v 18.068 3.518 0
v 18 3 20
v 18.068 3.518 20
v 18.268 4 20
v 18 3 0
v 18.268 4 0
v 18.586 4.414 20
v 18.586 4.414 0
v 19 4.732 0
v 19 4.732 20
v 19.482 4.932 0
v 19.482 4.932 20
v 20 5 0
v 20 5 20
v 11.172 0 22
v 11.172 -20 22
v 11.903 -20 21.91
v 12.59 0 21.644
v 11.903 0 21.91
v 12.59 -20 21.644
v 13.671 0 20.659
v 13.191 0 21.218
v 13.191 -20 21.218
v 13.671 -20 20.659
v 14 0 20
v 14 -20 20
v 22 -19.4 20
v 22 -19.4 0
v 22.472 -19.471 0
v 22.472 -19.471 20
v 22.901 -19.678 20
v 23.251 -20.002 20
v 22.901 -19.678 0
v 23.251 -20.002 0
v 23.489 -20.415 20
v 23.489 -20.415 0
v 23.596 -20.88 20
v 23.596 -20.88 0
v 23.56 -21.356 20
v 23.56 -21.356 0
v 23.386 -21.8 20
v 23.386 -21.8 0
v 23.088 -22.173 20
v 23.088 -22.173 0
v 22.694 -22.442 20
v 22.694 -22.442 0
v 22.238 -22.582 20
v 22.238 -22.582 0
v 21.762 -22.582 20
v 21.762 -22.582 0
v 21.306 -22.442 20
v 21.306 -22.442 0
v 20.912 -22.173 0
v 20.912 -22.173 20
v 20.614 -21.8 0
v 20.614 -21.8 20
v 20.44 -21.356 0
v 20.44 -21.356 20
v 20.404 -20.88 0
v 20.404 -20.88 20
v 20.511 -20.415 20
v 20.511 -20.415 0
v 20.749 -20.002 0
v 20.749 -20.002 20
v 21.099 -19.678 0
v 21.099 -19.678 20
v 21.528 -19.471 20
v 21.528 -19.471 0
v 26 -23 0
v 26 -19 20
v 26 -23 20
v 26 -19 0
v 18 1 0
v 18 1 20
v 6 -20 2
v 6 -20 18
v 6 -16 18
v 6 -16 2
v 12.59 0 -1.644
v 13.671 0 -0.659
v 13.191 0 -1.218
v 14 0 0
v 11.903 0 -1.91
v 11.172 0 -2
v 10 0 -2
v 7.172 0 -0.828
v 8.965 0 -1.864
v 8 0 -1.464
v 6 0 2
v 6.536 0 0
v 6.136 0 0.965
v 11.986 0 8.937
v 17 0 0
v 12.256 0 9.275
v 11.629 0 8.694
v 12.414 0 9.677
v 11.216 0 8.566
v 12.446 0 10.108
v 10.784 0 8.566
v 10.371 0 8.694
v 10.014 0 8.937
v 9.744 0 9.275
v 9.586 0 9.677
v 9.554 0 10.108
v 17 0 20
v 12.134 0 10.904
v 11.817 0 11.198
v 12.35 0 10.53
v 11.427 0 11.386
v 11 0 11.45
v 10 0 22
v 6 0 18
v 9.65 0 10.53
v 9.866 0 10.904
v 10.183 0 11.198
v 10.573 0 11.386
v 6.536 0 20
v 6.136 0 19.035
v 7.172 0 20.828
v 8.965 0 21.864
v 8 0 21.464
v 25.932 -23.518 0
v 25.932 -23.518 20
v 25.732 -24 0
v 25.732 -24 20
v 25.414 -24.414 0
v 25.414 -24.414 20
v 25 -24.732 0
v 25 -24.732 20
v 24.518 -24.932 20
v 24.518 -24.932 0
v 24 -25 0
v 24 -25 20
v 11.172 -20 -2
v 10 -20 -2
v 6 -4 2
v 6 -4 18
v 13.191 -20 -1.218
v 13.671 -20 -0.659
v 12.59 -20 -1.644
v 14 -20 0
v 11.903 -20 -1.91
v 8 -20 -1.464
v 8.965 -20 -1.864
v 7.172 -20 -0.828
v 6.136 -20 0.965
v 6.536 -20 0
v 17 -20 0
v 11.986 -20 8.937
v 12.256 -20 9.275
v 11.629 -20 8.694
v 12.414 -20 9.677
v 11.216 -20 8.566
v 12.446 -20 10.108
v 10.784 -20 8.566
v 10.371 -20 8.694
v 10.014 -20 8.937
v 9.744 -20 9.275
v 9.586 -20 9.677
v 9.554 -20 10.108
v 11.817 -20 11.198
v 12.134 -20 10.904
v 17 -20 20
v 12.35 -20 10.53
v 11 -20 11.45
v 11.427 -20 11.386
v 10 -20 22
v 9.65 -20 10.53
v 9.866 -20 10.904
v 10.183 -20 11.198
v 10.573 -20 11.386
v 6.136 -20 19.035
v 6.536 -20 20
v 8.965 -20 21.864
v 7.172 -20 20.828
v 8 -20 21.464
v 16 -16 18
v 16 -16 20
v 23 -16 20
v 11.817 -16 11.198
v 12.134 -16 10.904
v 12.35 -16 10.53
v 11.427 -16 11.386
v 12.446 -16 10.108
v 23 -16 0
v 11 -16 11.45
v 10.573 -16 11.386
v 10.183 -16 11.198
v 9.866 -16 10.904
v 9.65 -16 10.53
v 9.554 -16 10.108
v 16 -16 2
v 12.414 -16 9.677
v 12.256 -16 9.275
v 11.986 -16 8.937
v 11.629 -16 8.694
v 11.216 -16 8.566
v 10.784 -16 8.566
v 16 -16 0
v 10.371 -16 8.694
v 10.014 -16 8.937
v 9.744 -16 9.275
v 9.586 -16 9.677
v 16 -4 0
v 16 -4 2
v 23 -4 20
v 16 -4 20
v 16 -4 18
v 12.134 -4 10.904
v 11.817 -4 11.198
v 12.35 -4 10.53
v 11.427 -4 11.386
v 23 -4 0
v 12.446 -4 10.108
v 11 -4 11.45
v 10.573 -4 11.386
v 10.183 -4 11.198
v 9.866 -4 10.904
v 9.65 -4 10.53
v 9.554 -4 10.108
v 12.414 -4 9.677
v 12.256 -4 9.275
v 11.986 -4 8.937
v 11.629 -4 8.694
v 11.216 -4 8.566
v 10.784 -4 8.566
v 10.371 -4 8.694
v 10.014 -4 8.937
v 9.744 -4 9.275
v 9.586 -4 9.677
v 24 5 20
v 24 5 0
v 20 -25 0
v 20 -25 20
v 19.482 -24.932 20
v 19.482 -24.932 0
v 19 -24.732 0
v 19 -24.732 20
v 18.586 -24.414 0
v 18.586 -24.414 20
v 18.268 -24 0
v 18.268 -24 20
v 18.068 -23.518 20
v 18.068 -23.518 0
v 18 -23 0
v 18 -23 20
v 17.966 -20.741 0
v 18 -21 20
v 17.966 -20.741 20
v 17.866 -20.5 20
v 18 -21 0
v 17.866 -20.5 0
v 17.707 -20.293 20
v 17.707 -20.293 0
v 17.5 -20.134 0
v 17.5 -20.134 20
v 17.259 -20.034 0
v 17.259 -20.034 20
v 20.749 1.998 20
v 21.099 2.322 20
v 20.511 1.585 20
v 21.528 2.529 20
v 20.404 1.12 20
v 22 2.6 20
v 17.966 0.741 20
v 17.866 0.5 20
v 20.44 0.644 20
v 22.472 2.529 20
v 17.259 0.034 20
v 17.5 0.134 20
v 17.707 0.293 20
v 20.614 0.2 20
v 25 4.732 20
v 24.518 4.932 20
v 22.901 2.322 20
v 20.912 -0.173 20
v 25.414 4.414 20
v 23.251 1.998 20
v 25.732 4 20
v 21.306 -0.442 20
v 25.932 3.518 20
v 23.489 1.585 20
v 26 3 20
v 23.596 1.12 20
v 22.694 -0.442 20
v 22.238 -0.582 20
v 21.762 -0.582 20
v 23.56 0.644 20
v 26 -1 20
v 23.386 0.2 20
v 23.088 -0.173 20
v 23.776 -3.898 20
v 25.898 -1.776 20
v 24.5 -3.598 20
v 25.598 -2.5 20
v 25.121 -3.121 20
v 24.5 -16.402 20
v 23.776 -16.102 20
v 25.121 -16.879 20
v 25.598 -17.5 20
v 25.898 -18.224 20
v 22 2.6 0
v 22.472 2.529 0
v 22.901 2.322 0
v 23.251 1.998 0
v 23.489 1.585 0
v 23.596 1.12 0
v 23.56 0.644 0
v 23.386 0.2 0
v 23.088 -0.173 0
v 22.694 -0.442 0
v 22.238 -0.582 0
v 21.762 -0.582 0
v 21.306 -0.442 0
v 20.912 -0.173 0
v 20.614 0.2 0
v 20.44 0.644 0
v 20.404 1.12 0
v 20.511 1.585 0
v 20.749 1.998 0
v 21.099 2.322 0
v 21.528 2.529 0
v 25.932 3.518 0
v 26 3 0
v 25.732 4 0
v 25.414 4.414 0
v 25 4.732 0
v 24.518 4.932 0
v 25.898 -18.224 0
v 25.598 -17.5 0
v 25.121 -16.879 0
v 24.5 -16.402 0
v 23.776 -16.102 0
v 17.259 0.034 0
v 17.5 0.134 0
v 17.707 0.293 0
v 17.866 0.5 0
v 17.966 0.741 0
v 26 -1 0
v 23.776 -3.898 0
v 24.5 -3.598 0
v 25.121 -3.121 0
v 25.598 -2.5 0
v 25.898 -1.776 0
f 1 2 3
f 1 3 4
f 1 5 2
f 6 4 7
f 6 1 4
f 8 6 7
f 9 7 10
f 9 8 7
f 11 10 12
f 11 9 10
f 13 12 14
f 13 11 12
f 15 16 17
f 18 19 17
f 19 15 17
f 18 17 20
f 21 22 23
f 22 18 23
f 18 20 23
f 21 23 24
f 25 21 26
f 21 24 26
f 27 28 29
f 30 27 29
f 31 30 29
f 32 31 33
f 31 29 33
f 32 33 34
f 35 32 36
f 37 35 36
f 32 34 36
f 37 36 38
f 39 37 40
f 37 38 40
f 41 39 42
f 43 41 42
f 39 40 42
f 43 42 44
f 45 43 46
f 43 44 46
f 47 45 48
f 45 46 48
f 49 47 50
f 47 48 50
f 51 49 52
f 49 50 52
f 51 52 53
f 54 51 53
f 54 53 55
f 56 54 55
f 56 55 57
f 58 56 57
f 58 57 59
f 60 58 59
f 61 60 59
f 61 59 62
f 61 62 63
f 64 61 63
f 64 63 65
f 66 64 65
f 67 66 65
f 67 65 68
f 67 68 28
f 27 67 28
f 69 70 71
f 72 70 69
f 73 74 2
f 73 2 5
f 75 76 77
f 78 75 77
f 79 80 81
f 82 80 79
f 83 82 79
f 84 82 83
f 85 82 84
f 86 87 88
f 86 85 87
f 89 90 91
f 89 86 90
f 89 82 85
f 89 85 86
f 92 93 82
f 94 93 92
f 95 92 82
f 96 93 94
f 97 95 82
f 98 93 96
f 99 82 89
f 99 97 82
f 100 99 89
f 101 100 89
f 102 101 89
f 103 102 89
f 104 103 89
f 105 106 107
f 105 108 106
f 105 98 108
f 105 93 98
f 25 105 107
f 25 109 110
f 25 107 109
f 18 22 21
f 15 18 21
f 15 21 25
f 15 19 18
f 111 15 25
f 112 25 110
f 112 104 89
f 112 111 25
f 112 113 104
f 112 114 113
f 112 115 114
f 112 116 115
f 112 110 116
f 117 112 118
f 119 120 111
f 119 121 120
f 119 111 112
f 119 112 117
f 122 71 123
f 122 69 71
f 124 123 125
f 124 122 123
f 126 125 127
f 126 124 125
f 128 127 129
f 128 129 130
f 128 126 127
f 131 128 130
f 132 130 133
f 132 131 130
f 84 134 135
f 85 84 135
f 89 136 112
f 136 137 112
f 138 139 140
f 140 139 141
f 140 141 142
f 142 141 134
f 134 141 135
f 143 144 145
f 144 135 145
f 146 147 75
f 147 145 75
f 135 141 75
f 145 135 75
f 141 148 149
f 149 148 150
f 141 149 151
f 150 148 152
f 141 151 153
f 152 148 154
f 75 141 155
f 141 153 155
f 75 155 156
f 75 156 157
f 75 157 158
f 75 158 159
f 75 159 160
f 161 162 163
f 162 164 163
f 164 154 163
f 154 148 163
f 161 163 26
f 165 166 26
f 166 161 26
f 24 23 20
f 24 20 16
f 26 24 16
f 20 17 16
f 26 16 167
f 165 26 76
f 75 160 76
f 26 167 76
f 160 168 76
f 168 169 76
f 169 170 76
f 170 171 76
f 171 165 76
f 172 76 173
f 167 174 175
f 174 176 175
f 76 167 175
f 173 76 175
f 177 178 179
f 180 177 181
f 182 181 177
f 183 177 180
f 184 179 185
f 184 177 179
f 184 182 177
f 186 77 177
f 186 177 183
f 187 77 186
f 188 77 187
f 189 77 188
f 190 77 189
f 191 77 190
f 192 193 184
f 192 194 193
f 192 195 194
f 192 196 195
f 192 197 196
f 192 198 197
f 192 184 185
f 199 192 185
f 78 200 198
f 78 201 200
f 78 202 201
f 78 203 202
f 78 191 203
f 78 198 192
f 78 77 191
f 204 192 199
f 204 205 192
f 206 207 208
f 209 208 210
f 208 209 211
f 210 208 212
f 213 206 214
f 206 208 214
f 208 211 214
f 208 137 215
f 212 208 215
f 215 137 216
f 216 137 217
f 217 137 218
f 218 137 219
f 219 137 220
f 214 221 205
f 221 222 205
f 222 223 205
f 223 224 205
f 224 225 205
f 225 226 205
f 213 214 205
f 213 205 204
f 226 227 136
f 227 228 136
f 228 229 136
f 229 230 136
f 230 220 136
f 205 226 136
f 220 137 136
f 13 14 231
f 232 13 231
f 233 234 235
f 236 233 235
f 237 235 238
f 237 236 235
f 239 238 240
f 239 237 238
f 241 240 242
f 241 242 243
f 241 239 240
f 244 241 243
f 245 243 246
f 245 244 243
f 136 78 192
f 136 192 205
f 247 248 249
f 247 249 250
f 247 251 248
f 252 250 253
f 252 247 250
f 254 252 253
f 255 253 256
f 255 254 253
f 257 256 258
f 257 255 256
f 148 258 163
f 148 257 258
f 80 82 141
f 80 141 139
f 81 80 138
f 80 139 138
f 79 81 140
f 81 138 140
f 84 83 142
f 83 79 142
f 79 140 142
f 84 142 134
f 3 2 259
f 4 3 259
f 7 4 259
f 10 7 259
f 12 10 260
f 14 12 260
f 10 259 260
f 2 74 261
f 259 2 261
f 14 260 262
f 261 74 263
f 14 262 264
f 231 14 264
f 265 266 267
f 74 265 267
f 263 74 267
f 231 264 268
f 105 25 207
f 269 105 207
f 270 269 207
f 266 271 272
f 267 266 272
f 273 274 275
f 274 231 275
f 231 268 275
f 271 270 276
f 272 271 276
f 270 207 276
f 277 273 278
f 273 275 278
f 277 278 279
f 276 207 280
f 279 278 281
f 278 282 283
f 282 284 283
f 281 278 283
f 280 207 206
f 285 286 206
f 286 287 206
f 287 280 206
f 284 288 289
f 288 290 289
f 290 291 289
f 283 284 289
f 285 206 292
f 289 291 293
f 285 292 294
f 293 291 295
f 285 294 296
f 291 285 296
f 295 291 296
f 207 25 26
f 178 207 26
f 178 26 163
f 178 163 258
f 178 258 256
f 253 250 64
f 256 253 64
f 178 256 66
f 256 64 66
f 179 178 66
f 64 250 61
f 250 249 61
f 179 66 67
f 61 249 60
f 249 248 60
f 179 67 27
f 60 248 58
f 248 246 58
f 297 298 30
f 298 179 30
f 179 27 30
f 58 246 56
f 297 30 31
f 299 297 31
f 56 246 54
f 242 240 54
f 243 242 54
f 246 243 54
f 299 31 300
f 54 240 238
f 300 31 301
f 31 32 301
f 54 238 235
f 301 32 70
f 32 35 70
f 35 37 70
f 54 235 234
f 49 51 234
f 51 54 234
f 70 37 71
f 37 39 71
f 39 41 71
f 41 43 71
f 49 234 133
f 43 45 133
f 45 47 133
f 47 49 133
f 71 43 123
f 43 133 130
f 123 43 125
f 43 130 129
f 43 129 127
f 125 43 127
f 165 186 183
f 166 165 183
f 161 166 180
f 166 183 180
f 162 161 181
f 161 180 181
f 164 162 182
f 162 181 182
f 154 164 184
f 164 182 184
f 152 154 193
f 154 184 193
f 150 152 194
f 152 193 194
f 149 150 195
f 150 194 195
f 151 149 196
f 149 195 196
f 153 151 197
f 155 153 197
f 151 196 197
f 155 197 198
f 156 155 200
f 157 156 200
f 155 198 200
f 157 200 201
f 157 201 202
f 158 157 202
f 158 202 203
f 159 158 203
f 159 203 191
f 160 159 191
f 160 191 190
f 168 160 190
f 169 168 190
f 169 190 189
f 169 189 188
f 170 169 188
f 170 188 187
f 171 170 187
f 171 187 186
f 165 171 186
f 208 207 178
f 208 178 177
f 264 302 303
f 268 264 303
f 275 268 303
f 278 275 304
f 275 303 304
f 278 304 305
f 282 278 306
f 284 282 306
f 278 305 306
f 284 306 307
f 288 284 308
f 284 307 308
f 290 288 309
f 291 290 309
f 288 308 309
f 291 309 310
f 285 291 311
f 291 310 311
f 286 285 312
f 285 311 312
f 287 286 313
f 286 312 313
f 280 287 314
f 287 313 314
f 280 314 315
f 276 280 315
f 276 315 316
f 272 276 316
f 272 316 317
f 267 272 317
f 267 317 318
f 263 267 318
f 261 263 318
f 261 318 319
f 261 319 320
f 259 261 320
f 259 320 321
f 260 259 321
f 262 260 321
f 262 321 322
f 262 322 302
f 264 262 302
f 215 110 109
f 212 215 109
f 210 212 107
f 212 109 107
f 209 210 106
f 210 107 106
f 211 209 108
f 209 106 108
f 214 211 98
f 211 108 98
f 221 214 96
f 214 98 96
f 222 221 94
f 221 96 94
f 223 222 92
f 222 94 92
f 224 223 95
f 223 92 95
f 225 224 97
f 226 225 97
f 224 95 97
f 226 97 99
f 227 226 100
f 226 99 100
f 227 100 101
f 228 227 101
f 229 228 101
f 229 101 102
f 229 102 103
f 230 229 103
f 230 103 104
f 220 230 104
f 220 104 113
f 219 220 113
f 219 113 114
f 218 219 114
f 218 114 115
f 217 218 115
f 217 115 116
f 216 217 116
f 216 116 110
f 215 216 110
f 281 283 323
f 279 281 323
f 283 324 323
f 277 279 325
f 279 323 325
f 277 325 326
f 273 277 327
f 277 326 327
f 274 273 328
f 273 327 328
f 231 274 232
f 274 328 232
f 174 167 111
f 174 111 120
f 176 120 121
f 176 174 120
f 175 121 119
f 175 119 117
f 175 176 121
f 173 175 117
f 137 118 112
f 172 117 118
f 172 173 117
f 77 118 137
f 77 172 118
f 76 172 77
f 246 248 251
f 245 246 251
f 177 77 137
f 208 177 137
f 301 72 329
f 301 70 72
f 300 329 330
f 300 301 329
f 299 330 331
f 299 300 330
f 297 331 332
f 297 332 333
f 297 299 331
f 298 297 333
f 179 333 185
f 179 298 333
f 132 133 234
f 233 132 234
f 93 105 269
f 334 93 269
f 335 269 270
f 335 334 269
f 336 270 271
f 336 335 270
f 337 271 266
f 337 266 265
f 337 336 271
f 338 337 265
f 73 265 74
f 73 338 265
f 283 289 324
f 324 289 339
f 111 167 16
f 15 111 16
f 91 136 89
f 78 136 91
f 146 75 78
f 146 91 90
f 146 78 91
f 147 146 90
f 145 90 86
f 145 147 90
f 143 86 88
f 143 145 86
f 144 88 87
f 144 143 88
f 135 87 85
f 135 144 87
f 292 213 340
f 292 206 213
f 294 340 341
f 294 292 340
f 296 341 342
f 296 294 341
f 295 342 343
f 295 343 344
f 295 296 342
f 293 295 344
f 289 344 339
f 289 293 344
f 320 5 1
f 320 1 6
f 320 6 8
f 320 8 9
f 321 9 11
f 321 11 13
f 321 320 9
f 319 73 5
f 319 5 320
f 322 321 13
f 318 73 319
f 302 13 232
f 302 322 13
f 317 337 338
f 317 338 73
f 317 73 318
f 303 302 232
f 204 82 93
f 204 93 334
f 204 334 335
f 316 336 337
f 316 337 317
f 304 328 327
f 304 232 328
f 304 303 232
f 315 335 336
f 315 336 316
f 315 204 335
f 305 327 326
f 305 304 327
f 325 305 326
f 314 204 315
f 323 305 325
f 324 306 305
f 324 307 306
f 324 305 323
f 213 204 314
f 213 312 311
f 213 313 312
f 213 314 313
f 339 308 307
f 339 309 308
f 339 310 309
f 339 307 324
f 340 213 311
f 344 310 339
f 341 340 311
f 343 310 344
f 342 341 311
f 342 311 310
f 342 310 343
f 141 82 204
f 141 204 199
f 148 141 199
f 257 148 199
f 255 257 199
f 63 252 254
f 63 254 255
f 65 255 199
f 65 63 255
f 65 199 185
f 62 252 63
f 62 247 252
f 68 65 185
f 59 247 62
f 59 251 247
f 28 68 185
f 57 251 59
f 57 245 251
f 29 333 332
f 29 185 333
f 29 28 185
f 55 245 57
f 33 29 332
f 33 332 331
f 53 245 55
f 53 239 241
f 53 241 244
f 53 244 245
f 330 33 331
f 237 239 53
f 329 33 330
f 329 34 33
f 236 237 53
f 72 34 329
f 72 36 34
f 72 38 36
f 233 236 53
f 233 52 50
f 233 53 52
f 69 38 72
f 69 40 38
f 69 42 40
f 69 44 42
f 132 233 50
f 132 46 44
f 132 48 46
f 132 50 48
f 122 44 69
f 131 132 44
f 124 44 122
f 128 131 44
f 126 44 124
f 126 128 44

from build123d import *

# Parameters (mm, degrees)
SKETCH1_W           = 20
SKETCH1_H           = 20
BOSS_EXTRUDE1_DEPTH = 4
SKETCH2_R           = 3.7
CUT_EXTRUDE1_DEPTH  = 2.6
SKETCH3_R           = 2.1
CUT_EXTRUDE2_DEPTH  = 29.403520909
SKETCH4_W           = 12
SKETCH4_H           = 4
BOSS_EXTRUDE2_DEPTH = 12
SKETCH7_W           = 20
SKETCH7_H           = 4
BOSS_EXTRUDE3_DEPTH = 10
SKETCH8_W           = 8
SKETCH8_H           = 20
BOSS_EXTRUDE4_DEPTH = 5
SKETCH9_W           = 8
SKETCH9_H           = 20
BOSS_EXTRUDE5_DEPTH = 5
SKETCH10_R          = 1.6
CUT_EXTRUDE5_DEPTH  = 42.243181255
SKETCH11_W          = 30
SKETCH11_H          = 30
CUT_EXTRUDE6_DEPTH  = 6
SKETCH12_R          = 1.45
CUT_EXTRUDE7_DEPTH  = 42.243181255
SKETCH13_W          = 8
SKETCH13_H          = 20
BOSS_EXTRUDE6_DEPTH = 2
SKETCH14_W          = 8
SKETCH14_H          = 20
BOSS_EXTRUDE7_DEPTH = 2
SKETCH15_W          = 16
SKETCH15_H          = 12
CUT_EXTRUDE8_DEPTH  = 39.845849199
FILLET2_R           = 3
FILLET4_R           = 2
FILLET5_START       = -21
FILLET5_DEPTH       = 22
FILLET6_R           = 3
FILLET7_R           = 1
FILLET8_R           = 1


with BuildPart() as part:
    # Sketch1 → Boss-Extrude1 (new body)
    with BuildSketch(Plane(origin=(0, 0, 0), x_dir=(0, 0, -1), z_dir=(1, 0, 0))):
        with Locations((-10, -10)):
            Rectangle(SKETCH1_W, SKETCH1_H)
    extrude(amount=BOSS_EXTRUDE1_DEPTH)

    # Sketch2 → Cut-Extrude1 (cut)
    with BuildSketch(Plane(origin=(4, 0, 0), x_dir=(0, 0, -1), z_dir=(1, 0, 0))):
        with Locations((-10, -10)):
            Circle(SKETCH2_R)
    extrude(amount=-CUT_EXTRUDE1_DEPTH, mode=Mode.SUBTRACT)

    # Sketch3 → Cut-Extrude2 (cut, through all)
    with BuildSketch(Plane(origin=(1.4, 0, 0), x_dir=(0, 0, -1), z_dir=(1, 0, 0))):
        with Locations((-10, -10)):
            Circle(SKETCH3_R)
    extrude(amount=-CUT_EXTRUDE2_DEPTH, mode=Mode.SUBTRACT)

    # Sketch4 → Boss-Extrude2 (add)
    with BuildSketch(Plane(origin=(4, 0, 0), x_dir=(0, 0, -1), z_dir=(1, 0, 0))):
        Polygon((-20, 0), (-20, -20), (-16, -20), (-16, -16), (-16, -4), (-16, 0), align=None)
        with Locations((-10, -18)):
            Rectangle(SKETCH4_W, SKETCH4_H)
        Polygon((-4, -16), (-4, -20), (0, -20), (0, -4), (-4, -4), align=None)
        Polygon((0, 0), (-16, 0), (-16, -4), (-4, -4), (0, -4), align=None)
    extrude(amount=BOSS_EXTRUDE2_DEPTH)

    # Sketch7 → Boss-Extrude3 (add)
    with BuildSketch(Plane(origin=(16, 0, 0), x_dir=(0, 0, -1), z_dir=(1, 0, 0))):
        with Locations((-10, -18)):
            Rectangle(SKETCH7_W, SKETCH7_H)
        with Locations((-10, -2)):
            Rectangle(SKETCH7_W, SKETCH7_H)
    extrude(amount=BOSS_EXTRUDE3_DEPTH)

    # Sketch8 → Boss-Extrude4 (add)
    with BuildSketch(Plane(origin=(0, -20, 0), x_dir=(-1, 0, 0), z_dir=(0, -1, 0))):
        with Locations((-22, -10)):
            Rectangle(SKETCH8_W, SKETCH8_H)
    extrude(amount=BOSS_EXTRUDE4_DEPTH)

    # Sketch9 → Boss-Extrude5 (add)
    with BuildSketch(Plane(origin=(0, 0, 0), x_dir=(1, 0, 0), z_dir=(0, 1, 0))):
        with Locations((22, -10)):
            Rectangle(SKETCH9_W, SKETCH9_H)
    extrude(amount=BOSS_EXTRUDE5_DEPTH)

    # Sketch10 → Cut-Extrude5 (cut, through all)
    with BuildSketch(Plane(origin=(0, 0, 0), x_dir=(-1, 0, 0), z_dir=(0, 0, -1))):
        with Locations(Location((-22, 1, 0), (0, 0, 90))):
            Circle(SKETCH10_R)
        with Locations(Location((-22, -21, 0), (0, 0, 90))):
            Circle(SKETCH10_R)
    extrude(amount=-CUT_EXTRUDE5_DEPTH, mode=Mode.SUBTRACT)

    # Sketch11 → Cut-Extrude6 (cut)
    with BuildSketch(Plane.ZY):
        with Locations((15, -5)):
            Rectangle(SKETCH11_W, SKETCH11_H)
    extrude(amount=-CUT_EXTRUDE6_DEPTH, mode=Mode.SUBTRACT)

    # Sketch12 → Cut-Extrude7 (cut, through all)
    with BuildSketch(Plane(origin=(0, 0, 0), x_dir=(1, 0, 0), z_dir=(0, 1, 0))):
        with Locations(Location((11, -10, 0), (0, 0, 270))):
            Circle(SKETCH12_R)
    extrude(amount=-CUT_EXTRUDE7_DEPTH, mode=Mode.SUBTRACT)

    # Sketch13 → Boss-Extrude6 (add)
    with BuildSketch(Plane.XY.offset(20)):
        with Locations((10, -10)):
            Rectangle(SKETCH13_W, SKETCH13_H)
    extrude(amount=BOSS_EXTRUDE6_DEPTH)

    # Sketch14 → Boss-Extrude7 (add)
    with BuildSketch(Plane(origin=(0, 0, 0), x_dir=(-1, 0, 0), z_dir=(0, 0, -1))):
        with Locations((-10, -10)):
            Rectangle(SKETCH14_W, SKETCH14_H)
    extrude(amount=BOSS_EXTRUDE7_DEPTH)

    # Sketch15 → Cut-Extrude8 (cut, through all)
    with BuildSketch(Plane.ZY.offset(-6)):
        with Locations((10, -10)):
            Rectangle(SKETCH15_W, SKETCH15_H)
    extrude(amount=-CUT_EXTRUDE8_DEPTH, mode=Mode.SUBTRACT)

    # Fillet2
    fillet2_edges = [part.edges().sort_by_distance(p)[0] for p in [
        (26, -16, 10),
        (26, -4, 10),
    ]]
    fillet(fillet2_edges, radius=FILLET2_R)

    # Fillet4
    fillet4_edges = [part.edges().sort_by_distance(p)[0] for p in [
        (26, -25, 10),
        (18, -25, 10),
        (26, 5, 10),
        (18, 5, 10),
    ]]
    fillet(fillet4_edges, radius=FILLET4_R)

    # Fillet5: read off the stored shape, not the designer's step
    # Fillet5 outline → Fillet5 (cut)
    with BuildSketch(Plane(origin=(0, 0, 0), x_dir=(1, 0, 0), z_dir=(0, 1, 0)).offset(FILLET5_START)):
        with BuildLine():
            Line((6, 2), (6, -2))
            ThreePointArc((6, -2), (7.171572875, 0.828427125), (10, 2))
            Line((10, 2), (6, 2))
        make_face()
        with BuildLine():
            ThreePointArc((10, -22), (7.171572875, -20.828427125), (6, -18))
            Line((6, -18), (6, -22))
            Line((6, -22), (10, -22))
        make_face()
    extrude(amount=FILLET5_DEPTH, mode=Mode.SUBTRACT)

    # Fillet6
    # the kernel refuses this fillet: 3 mm, written as the material it takes off along each edge
    with BuildSketch(Plane(origin=(14, -27.071067812, -2), x_dir=(-1, 0, 0), z_dir=(0, 1, 0))) as fillet6_piece_1:
        with BuildLine():
            CenterArc((2.828427125, 3), FILLET6_R, 199.471220634, 70.528779366)
            Line((0, 2), (-0.056568542, 1.98))
            ThreePointArc((-0.056568542, 1.98), (-0.06, 1), (-0.06, 0))
            Line((-0.06, 0), (0, -0.06))
            Line((0, -0.06), (2.828427125, -0.06))
            Line((2.828427125, -0.06), (2.828427125, 0))
        make_face()
    extrude(amount=34.142135624, mode=Mode.SUBTRACT)
    with BuildSketch(Plane(origin=(14, -27.071067812, 22), x_dir=(0, 0, -1), z_dir=(0, 1, 0))) as fillet6_piece_2:
        with BuildLine():
            CenterArc((3, 2.828427125), FILLET6_R, 180, 70.528779366)
            Line((0, 2.828427125), (-0.06, 2.828427125))
            Line((-0.06, 2.828427125), (-0.06, 0))
            Line((-0.06, 0), (0, -0.06))
            ThreePointArc((0, -0.06), (1, -0.06), (1.98, -0.056568542))
            Line((1.98, -0.056568542), (2, 0))
        make_face()
    extrude(amount=34.142135624, mode=Mode.SUBTRACT)

    # Fillet7
    fillet7_edges = [part.edges().sort_by_distance(p)[0] for p in [
        (18, -20, 10),
    ]]
    fillet(fillet7_edges, radius=FILLET7_R)

    # Fillet8
    fillet8_edges = [part.edges().sort_by_distance(p)[0] for p in [
        (18, 0, 10),
    ]]
    fillet(fillet8_edges, radius=FILLET8_R)


solid = part.part
